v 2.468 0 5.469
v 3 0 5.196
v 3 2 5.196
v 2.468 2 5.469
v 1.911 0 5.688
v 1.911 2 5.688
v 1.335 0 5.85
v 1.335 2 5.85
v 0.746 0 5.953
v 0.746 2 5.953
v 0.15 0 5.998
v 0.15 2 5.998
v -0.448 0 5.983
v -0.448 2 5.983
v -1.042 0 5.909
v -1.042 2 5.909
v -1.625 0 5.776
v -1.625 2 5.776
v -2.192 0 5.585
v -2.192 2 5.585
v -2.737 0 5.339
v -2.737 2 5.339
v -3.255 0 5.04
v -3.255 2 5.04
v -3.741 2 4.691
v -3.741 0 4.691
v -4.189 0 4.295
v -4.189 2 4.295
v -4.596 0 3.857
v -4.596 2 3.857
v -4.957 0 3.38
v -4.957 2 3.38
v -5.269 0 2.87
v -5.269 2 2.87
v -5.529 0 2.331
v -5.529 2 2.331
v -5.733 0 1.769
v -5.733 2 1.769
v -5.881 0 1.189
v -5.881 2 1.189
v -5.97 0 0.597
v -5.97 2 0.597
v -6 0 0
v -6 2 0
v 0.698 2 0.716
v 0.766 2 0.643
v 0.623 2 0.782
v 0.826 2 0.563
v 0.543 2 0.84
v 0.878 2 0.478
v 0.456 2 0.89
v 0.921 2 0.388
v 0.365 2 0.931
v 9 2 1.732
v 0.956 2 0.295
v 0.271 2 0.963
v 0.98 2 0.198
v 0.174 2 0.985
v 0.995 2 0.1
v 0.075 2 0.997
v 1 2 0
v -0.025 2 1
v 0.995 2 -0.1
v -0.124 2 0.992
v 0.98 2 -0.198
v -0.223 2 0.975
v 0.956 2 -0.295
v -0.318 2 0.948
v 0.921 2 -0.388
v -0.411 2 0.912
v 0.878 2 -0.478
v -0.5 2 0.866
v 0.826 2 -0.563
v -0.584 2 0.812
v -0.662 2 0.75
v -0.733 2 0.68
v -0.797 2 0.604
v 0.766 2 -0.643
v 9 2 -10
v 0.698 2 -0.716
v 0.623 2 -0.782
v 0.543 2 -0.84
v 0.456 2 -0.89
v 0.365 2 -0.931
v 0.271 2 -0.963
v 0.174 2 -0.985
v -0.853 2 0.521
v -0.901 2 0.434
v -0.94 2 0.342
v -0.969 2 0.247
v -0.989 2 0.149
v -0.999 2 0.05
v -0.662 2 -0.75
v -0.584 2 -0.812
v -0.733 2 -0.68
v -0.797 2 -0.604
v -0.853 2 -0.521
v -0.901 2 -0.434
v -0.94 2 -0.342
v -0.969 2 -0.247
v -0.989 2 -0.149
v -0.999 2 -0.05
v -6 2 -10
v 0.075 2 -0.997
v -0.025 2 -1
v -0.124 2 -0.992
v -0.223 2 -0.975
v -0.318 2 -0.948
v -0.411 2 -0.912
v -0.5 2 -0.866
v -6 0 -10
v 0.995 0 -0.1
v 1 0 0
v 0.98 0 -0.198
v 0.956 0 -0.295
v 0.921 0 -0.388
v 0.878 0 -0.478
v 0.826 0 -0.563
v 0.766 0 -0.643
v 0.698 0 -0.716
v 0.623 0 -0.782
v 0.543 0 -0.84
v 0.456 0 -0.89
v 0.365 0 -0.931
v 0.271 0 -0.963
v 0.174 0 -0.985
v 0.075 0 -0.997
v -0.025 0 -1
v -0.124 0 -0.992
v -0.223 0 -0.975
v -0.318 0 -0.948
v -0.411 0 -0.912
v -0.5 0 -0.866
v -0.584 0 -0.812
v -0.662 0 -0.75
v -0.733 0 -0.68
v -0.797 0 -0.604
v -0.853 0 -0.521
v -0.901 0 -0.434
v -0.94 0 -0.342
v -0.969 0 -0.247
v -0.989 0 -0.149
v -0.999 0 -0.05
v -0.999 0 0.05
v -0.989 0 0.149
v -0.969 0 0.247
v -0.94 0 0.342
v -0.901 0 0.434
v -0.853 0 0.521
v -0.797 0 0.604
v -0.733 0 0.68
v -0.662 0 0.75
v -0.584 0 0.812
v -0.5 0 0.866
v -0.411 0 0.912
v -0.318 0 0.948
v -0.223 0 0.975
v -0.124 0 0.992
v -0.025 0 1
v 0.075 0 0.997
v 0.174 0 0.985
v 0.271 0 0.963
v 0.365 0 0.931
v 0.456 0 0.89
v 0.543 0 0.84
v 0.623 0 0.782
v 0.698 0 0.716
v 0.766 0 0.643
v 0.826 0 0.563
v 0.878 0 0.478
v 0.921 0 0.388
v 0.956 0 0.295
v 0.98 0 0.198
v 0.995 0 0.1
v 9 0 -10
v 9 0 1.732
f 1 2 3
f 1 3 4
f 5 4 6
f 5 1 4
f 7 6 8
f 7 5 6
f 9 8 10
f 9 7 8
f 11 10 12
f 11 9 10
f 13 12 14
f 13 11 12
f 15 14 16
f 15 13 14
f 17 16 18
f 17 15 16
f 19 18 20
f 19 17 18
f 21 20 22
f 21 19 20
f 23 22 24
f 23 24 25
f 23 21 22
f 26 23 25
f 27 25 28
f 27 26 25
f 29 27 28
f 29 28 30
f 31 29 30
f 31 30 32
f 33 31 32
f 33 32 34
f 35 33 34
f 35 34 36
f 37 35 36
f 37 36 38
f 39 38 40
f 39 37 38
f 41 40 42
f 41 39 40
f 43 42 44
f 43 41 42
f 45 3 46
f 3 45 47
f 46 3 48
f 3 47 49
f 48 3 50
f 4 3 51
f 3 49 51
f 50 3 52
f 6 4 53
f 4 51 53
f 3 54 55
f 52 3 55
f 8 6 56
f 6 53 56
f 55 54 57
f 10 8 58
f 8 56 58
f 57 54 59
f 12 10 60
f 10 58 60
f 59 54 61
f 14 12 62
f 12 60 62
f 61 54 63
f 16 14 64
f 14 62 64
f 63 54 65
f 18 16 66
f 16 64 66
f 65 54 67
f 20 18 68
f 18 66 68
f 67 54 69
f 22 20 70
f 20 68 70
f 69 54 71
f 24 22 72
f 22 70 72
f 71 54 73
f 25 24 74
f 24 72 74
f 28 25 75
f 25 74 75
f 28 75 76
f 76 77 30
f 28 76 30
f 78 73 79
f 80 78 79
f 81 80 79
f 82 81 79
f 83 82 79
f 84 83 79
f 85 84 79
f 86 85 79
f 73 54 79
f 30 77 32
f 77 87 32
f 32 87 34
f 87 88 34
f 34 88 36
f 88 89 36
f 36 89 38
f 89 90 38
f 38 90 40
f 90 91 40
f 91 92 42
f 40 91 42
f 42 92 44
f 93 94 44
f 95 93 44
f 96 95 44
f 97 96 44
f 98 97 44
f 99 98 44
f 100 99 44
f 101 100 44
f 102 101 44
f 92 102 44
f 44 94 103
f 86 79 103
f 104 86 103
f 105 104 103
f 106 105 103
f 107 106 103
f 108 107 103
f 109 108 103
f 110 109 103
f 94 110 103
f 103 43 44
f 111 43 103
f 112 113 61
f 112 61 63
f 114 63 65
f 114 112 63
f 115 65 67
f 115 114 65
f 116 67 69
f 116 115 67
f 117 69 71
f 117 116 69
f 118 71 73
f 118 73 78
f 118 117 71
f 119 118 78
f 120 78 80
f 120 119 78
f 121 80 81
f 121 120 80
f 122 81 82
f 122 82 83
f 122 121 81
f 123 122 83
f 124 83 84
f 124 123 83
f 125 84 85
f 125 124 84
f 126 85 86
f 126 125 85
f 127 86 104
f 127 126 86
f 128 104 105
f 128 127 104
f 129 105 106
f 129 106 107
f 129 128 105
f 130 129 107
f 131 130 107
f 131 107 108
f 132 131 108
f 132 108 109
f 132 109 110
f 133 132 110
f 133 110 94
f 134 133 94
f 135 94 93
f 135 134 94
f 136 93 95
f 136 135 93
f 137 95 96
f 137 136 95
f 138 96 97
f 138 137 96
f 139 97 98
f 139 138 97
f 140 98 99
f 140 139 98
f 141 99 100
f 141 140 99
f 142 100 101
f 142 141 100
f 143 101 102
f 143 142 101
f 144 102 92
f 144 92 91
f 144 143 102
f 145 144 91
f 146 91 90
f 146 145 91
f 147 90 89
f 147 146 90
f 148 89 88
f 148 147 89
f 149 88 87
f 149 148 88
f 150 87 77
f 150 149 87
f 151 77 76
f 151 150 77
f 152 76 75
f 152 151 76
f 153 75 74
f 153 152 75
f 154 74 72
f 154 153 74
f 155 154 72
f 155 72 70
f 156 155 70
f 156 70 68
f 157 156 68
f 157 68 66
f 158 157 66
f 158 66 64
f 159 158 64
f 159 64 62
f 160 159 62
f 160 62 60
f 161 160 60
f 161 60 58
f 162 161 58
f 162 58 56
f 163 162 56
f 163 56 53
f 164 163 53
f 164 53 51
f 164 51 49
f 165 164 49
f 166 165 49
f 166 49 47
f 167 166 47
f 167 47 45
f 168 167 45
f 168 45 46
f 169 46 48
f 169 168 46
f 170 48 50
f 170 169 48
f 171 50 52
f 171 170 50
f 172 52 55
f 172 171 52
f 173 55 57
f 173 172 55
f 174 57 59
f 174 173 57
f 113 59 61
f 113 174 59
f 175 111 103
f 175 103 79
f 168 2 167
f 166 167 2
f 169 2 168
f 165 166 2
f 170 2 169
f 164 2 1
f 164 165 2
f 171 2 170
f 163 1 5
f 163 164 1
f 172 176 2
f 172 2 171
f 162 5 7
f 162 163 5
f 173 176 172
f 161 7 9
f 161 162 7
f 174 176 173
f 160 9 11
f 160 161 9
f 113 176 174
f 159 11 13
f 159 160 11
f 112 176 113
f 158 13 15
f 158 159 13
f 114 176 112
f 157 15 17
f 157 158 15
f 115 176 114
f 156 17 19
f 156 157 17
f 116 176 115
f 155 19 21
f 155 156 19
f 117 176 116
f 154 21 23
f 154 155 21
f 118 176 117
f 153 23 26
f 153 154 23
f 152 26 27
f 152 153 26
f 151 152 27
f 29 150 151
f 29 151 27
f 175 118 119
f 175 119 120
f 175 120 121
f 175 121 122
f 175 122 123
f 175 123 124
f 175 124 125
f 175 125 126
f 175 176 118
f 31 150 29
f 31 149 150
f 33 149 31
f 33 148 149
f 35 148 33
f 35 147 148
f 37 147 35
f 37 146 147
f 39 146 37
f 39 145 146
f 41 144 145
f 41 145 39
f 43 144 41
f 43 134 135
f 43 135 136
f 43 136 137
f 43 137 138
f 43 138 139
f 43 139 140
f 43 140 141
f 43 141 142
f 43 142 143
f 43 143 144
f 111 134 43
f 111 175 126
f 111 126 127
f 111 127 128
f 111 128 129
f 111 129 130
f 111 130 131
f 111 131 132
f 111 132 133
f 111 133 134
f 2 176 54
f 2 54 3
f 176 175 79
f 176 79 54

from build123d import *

# Parameters (mm, degrees)
ESQUISSE1_R        = 1
BOSS_EXTRU_1_DEPTH = 2


with BuildPart() as part:
    # Esquisse1 → Boss.-Extru.1 (new body)
    with BuildSketch(Plane(origin=(0, 0, 0), x_dir=(1, 0, 0), z_dir=(0, 1, 0))):
        with BuildLine():
            Line((-6, 0), (-6, 10))
            Line((-6, 10), (9, 10))
            Line((9, 10), (9, -1.732050808))
            Line((9, -1.732050808), (3, -5.196152423))
            ThreePointArc((3, -5.196152423), (-3, -5.196152423), (-6, 0))
        make_face()
        Circle(ESQUISSE1_R, mode=Mode.SUBTRACT)
    extrude(amount=BOSS_EXTRU_1_DEPTH)


solid = part.part
